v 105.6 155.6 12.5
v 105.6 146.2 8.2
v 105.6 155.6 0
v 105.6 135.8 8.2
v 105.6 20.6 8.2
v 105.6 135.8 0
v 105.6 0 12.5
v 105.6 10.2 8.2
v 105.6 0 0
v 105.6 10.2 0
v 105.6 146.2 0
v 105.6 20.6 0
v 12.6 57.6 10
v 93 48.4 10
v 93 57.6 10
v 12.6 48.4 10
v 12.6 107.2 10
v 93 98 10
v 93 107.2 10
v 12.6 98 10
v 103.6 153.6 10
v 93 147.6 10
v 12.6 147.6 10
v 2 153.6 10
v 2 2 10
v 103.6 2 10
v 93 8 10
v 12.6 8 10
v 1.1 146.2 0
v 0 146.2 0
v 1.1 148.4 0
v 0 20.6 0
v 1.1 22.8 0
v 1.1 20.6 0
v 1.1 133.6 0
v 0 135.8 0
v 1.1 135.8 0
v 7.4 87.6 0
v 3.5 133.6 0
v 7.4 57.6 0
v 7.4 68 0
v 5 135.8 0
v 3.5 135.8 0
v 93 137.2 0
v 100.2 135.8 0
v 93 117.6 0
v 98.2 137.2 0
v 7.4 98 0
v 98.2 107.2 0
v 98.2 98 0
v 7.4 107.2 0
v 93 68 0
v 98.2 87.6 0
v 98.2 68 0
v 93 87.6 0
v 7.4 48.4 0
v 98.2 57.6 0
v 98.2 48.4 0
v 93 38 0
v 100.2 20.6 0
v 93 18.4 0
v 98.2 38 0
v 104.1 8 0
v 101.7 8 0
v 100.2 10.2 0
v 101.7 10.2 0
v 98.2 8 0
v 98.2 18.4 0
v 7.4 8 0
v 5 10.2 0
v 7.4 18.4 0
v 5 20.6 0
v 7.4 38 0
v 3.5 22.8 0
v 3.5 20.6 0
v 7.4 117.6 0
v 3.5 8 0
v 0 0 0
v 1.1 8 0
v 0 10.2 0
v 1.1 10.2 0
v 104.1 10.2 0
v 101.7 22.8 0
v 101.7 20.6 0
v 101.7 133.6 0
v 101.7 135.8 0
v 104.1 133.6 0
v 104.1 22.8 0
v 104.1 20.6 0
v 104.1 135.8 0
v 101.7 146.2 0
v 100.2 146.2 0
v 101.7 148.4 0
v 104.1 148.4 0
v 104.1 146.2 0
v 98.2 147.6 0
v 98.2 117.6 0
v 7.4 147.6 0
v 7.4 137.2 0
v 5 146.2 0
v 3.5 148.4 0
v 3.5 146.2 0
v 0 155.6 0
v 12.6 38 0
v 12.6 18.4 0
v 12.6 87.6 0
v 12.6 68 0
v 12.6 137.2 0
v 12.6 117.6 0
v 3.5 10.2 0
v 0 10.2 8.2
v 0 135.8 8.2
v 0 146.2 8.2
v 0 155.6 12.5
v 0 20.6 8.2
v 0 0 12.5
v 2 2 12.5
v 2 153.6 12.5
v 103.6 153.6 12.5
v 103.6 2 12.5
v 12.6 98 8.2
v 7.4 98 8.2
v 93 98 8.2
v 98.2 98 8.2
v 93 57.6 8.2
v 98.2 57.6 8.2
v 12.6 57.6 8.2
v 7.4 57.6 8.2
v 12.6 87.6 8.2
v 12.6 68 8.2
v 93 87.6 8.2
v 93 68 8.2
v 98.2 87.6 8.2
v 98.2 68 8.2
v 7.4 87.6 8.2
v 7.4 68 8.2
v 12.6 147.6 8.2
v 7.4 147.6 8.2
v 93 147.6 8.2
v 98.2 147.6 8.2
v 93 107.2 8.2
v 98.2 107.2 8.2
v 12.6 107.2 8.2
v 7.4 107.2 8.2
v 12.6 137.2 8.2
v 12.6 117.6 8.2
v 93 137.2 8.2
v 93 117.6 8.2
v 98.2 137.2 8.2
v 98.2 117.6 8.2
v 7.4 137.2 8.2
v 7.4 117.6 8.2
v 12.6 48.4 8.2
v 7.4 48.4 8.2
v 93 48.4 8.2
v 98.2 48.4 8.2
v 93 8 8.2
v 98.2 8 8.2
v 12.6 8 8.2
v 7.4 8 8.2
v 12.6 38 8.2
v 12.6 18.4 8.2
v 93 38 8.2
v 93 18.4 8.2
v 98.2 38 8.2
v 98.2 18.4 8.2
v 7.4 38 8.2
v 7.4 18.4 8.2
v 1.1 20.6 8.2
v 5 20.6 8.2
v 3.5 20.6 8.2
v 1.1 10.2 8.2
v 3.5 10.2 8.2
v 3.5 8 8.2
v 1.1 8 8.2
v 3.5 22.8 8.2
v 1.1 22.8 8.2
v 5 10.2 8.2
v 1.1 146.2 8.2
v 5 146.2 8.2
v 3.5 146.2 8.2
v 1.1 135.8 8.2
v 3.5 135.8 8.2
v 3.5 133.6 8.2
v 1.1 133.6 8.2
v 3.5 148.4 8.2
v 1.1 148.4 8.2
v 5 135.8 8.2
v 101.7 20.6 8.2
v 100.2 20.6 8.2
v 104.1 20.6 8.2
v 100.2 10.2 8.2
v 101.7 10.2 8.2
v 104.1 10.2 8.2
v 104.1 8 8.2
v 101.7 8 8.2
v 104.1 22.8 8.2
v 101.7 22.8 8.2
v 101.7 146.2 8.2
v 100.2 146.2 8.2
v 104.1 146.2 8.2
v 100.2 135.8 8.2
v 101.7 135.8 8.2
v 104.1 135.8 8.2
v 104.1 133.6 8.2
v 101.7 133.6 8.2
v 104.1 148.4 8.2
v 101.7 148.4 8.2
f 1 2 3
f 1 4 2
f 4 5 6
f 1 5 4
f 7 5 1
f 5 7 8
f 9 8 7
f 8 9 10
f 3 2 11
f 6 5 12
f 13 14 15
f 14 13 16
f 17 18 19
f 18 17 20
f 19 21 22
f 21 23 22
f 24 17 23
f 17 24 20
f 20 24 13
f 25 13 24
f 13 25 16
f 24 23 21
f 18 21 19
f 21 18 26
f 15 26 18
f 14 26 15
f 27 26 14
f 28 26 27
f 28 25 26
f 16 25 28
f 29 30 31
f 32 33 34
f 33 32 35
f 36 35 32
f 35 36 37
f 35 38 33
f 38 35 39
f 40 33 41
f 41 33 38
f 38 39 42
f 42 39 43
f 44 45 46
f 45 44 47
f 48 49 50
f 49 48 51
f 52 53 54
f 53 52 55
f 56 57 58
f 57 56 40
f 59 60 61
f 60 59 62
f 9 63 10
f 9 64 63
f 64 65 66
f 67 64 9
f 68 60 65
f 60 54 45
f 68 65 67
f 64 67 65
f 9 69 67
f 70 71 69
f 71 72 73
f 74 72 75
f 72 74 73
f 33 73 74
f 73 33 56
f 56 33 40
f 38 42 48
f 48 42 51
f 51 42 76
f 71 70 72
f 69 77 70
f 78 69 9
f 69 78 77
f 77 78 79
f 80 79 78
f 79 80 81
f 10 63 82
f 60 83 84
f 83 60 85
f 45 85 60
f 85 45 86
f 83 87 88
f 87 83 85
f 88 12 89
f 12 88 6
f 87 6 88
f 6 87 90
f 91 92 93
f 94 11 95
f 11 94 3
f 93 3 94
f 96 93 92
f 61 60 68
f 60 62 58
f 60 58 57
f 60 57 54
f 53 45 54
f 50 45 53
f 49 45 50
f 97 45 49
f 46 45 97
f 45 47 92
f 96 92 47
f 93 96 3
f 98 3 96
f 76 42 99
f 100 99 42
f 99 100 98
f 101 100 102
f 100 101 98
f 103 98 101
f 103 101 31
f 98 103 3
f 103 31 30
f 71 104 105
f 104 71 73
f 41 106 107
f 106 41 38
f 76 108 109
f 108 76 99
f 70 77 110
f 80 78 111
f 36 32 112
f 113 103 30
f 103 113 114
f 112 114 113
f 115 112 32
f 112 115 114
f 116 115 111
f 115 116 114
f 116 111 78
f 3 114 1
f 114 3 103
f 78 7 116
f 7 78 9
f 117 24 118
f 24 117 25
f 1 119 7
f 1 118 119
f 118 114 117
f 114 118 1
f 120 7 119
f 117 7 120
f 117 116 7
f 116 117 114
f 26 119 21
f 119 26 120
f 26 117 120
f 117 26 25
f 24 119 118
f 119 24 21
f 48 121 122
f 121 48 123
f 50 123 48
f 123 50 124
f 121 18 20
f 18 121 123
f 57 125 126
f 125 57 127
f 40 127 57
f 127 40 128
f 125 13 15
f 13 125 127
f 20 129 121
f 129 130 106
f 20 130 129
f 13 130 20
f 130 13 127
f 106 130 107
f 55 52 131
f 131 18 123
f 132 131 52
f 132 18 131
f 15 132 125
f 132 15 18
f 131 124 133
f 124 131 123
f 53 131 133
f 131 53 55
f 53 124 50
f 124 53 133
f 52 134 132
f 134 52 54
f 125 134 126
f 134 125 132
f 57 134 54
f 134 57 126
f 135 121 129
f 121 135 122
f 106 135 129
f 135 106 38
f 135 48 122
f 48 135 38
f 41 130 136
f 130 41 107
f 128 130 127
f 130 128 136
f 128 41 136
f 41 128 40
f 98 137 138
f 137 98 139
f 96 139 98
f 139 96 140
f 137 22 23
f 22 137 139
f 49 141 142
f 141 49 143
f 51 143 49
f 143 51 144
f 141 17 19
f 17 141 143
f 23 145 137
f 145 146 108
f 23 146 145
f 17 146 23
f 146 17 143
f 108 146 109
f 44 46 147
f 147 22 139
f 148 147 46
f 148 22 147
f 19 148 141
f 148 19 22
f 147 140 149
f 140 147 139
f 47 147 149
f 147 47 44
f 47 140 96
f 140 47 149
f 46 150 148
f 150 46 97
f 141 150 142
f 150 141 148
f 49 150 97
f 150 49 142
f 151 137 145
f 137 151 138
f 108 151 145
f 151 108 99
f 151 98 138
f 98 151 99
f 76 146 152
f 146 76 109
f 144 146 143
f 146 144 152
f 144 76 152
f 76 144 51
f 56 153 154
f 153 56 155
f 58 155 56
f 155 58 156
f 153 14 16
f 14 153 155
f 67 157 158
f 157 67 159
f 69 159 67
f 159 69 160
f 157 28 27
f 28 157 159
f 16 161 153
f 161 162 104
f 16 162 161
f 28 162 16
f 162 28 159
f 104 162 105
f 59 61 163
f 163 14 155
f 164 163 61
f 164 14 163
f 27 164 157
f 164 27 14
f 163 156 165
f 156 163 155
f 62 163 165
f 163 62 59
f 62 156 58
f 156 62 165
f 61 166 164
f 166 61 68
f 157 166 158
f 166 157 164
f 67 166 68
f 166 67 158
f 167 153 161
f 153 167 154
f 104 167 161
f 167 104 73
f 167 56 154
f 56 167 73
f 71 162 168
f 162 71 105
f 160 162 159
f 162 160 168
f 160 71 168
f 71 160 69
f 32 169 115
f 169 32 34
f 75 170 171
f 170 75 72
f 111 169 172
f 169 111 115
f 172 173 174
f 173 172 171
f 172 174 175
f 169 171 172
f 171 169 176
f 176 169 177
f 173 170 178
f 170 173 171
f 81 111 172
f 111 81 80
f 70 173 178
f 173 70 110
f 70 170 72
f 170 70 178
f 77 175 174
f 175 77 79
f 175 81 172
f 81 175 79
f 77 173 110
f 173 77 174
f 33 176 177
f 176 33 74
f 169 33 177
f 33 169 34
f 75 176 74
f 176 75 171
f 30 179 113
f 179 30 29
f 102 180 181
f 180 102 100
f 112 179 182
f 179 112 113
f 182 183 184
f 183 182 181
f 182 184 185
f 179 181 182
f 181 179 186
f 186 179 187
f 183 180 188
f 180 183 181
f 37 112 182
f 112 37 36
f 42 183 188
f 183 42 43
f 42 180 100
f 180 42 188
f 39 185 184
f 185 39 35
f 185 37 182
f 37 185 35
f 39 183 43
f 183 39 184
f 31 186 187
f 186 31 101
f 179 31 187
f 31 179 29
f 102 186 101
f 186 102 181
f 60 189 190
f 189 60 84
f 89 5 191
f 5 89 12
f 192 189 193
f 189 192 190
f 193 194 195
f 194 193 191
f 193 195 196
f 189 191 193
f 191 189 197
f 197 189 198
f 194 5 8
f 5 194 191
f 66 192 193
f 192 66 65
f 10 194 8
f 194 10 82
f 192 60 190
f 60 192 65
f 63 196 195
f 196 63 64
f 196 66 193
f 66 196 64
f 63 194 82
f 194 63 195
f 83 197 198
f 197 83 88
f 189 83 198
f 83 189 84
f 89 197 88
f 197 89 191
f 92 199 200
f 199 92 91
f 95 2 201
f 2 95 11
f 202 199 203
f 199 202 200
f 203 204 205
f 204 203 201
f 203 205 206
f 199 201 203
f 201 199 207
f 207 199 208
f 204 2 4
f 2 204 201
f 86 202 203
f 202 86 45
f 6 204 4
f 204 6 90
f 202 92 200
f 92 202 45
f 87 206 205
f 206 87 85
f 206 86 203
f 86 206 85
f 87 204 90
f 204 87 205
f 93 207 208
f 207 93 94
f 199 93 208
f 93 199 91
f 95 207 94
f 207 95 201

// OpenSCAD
// Width of the image format
image_width = 100;
// Height of the image format
image_length = 150;
// Tolerance of the image (normally the print is a few mm bigger)
image_tolerance = 2;
// Printing Tolerance (use 0.1 to 0.2mm)
tolerance = 0.2;
// Height of the Frame (10, 20, 40, 80, etc.)
height=10;
// Height of the small image border on top of the base plate, to get a glas front between image and cover
image_border_height = 2.5;

// add 0 to some values, to hide it in the customizer UI
image_border_width = 2+0;
width=image_width+image_border_width*2+image_tolerance; // 106, 156
length=image_length+image_border_width*2+image_tolerance; // 156, 206,330
toleranced_width = width - tolerance*2;
toleranced_length = length - tolerance*2;
base_height = 8+tolerance;
y_spacing = 8+0;
x_spacing = 8+0;

// FrexyBackInsert
insert_width = 40+0;
insert_length = 80+0;
side_cube_width = 10+0;
side_cube_length = 5+0;
insert_side_width = 10+0;
insert_side_length = 5+0;
insert_side_offset = 10+0;
side_cube_insert_side_width = 2+0;
side_cube_insert_side_length = 2+0;
toleranced_insert_width = insert_width + tolerance * 2;
toleranced_insert_length = insert_length + tolerance * 2;
toleranced_side_cube_width = side_cube_width + tolerance * 2;
toleranced_side_cube_length = side_cube_length + tolerance;
toleranced_insert_side_width = insert_side_width + tolerance*2;
toleranced_insert_side_length = insert_side_length + tolerance*2;
toleranced_side_cube_insert_side_width = side_cube_insert_side_width + tolerance;
toleranced_side_cube_insert_side_length = side_cube_insert_side_length + tolerance*2;

module FrexyBackInsert(
    insert_width = 40,
    insert_length = 80,
    side_cube_width = 10,
    side_cube_length = 5,
    height=10,
    base_height = 8.2
) {
    union() {
        cube([insert_width, insert_length, height]);
        translate([insert_width - side_cube_width, -side_cube_length, 0])
        cube([side_cube_width, side_cube_length, base_height]);
        translate([0, -side_cube_length, 0])
        cube([side_cube_width, side_cube_length, base_height]);
        translate([insert_width - side_cube_width, insert_length, 0])
        cube([side_cube_width, side_cube_length, base_height]);
        translate([0, insert_length, 0])
        cube([side_cube_width, side_cube_length, base_height]);
    }
}

module FrexySideInsert(
    width=10,
    length=5,
    height=8.2,
    side_cube_width=2,
    side_cube_length=2
) {
    translate([side_cube_width,0,0]) union() {
        cube([width,length,height]);
        translate([-side_cube_width,length/2-side_cube_length/2,0]) cube([side_cube_width,side_cube_length,height]);
                translate([width,length/2-side_cube_length/2,0]) cube([side_cube_width,side_cube_length,height]);
    }
}

x_mid = ((toleranced_width/2)+(toleranced_insert_length/2));
y_mid = ((toleranced_length/2)-(toleranced_insert_width/2));

real_y_amount = floor((toleranced_length-y_spacing)/(toleranced_insert_width+y_spacing));
real_x_amount = floor((toleranced_width-x_spacing)/(toleranced_insert_length+x_spacing));
// don't use real_y_amount, because we only want an uneven number, to have one insert always in the middle
y_amount = (real_y_amount % 2 == 0) ? real_y_amount - 1 : real_y_amount;
x_amount = (real_x_amount % 2 == 0) ? real_x_amount - 1 : real_x_amount;
echo("x amount", x_amount);
echo("y_amount", y_amount);

y_gap = (y_amount < 2) ? 0 :(toleranced_length-y_spacing*2-toleranced_insert_width*y_amount)/(y_amount-1);
x_gap = (x_amount < 2) ? 0 :(toleranced_width-x_spacing*2-toleranced_insert_length*x_amount)/(x_amount-1);
echo("x_gap", x_gap);
echo("y_gap", y_gap);
difference() {
union() {
    // base element
    cube([toleranced_width,toleranced_length, height]);

    // image_border
    translate([0, 0, height]) cube([image_border_width,toleranced_length, image_border_height]);
    translate([toleranced_width-image_border_width, 0, height]) cube([image_border_width,toleranced_length, image_border_height]);
    translate([0, 0, height]) cube([toleranced_width, image_border_width, image_border_height]);
    translate([0, toleranced_length-image_border_width, height]) cube([toleranced_width, image_border_width, image_border_height]);
}
// inserts
for (j = [0:1:x_amount-1]) {
    half_j = floor(j/2);
    for (i = [0:1:y_amount-1]) {
        half_i = floor(i/2);
        y_offset = (i == 0) ? y_mid : y_mid + ((i % 2 == 0) ? -(i-half_i):i-half_i)*(toleranced_insert_width + y_gap);
        x_offset = (j == 0) ? -x_mid : -x_mid + ((j % 2 == 0) ? -(j-half_j):j-half_j)*(toleranced_insert_length + x_gap);
        rotate([0,0,90]) translate([
            y_offset,
            x_offset,
            0
            ]) FrexyBackInsert(
            insert_width=toleranced_insert_width,
            insert_length=toleranced_insert_length,
            side_cube_width=toleranced_side_cube_width,
            side_cube_length=toleranced_side_cube_length,
            height=height,
            base_height=base_height
        );
    }
}

// insert spacings
y_insert_spacing = y_gap - y_spacing*2;
if (y_insert_spacing > 5) {
    y_insert_spacing_mid = y_mid-y_spacing;
    for (i = [-1:1:y_amount-1-1]) {//y_amount-1-1
        half_i = floor(i/2);
        min_plus_multiplicator = ((i == -1) ? 0 : (i % 2 == 0) ? -(i-half_i+1):i-half_i);
        current_offset = (toleranced_insert_width+y_spacing*2+y_insert_spacing) * ((i == 1) ? 1 : min_plus_multiplicator);
        echo(current_offset);
        current_y_insert_spacing_mid = y_insert_spacing_mid+current_offset;
               translate([x_mid-toleranced_insert_length,
       current_y_insert_spacing_mid,
       0])
        rotate([0,0,-90])
        cube([y_insert_spacing, toleranced_insert_length, height]);
    }
}


// side inserts
rotate([0,0,90]) translate([insert_side_offset-side_cube_insert_side_width,-insert_side_length,0]) FrexySideInsert(
    width=toleranced_insert_side_width, length=toleranced_insert_side_length, height=base_height,
    side_cube_width=toleranced_side_cube_insert_side_width,
    side_cube_length=toleranced_side_cube_insert_side_length);
rotate([0,0,90]) translate([toleranced_length-insert_side_offset-insert_side_width-side_cube_insert_side_width,-insert_side_length,0]) FrexySideInsert(
    width=toleranced_insert_side_width, length=toleranced_insert_side_length, height=base_height,
    side_cube_width=toleranced_side_cube_insert_side_width,
    side_cube_length=toleranced_side_cube_insert_side_length);

rotate([0,0,90]) translate([insert_side_offset-side_cube_insert_side_width,-toleranced_width,0]) FrexySideInsert(
    width=toleranced_insert_side_width, length=toleranced_insert_side_length, height=base_height,
    side_cube_width=toleranced_side_cube_insert_side_width,
    side_cube_length=toleranced_side_cube_insert_side_length);
rotate([0,0,90]) translate([toleranced_length-insert_side_offset-insert_side_width-side_cube_insert_side_width,-toleranced_width,0]) FrexySideInsert(
    width=toleranced_insert_side_width, length=toleranced_insert_side_length, height=base_height,
    side_cube_width=toleranced_side_cube_insert_side_width,
    side_cube_length=toleranced_side_cube_insert_side_length);
}
